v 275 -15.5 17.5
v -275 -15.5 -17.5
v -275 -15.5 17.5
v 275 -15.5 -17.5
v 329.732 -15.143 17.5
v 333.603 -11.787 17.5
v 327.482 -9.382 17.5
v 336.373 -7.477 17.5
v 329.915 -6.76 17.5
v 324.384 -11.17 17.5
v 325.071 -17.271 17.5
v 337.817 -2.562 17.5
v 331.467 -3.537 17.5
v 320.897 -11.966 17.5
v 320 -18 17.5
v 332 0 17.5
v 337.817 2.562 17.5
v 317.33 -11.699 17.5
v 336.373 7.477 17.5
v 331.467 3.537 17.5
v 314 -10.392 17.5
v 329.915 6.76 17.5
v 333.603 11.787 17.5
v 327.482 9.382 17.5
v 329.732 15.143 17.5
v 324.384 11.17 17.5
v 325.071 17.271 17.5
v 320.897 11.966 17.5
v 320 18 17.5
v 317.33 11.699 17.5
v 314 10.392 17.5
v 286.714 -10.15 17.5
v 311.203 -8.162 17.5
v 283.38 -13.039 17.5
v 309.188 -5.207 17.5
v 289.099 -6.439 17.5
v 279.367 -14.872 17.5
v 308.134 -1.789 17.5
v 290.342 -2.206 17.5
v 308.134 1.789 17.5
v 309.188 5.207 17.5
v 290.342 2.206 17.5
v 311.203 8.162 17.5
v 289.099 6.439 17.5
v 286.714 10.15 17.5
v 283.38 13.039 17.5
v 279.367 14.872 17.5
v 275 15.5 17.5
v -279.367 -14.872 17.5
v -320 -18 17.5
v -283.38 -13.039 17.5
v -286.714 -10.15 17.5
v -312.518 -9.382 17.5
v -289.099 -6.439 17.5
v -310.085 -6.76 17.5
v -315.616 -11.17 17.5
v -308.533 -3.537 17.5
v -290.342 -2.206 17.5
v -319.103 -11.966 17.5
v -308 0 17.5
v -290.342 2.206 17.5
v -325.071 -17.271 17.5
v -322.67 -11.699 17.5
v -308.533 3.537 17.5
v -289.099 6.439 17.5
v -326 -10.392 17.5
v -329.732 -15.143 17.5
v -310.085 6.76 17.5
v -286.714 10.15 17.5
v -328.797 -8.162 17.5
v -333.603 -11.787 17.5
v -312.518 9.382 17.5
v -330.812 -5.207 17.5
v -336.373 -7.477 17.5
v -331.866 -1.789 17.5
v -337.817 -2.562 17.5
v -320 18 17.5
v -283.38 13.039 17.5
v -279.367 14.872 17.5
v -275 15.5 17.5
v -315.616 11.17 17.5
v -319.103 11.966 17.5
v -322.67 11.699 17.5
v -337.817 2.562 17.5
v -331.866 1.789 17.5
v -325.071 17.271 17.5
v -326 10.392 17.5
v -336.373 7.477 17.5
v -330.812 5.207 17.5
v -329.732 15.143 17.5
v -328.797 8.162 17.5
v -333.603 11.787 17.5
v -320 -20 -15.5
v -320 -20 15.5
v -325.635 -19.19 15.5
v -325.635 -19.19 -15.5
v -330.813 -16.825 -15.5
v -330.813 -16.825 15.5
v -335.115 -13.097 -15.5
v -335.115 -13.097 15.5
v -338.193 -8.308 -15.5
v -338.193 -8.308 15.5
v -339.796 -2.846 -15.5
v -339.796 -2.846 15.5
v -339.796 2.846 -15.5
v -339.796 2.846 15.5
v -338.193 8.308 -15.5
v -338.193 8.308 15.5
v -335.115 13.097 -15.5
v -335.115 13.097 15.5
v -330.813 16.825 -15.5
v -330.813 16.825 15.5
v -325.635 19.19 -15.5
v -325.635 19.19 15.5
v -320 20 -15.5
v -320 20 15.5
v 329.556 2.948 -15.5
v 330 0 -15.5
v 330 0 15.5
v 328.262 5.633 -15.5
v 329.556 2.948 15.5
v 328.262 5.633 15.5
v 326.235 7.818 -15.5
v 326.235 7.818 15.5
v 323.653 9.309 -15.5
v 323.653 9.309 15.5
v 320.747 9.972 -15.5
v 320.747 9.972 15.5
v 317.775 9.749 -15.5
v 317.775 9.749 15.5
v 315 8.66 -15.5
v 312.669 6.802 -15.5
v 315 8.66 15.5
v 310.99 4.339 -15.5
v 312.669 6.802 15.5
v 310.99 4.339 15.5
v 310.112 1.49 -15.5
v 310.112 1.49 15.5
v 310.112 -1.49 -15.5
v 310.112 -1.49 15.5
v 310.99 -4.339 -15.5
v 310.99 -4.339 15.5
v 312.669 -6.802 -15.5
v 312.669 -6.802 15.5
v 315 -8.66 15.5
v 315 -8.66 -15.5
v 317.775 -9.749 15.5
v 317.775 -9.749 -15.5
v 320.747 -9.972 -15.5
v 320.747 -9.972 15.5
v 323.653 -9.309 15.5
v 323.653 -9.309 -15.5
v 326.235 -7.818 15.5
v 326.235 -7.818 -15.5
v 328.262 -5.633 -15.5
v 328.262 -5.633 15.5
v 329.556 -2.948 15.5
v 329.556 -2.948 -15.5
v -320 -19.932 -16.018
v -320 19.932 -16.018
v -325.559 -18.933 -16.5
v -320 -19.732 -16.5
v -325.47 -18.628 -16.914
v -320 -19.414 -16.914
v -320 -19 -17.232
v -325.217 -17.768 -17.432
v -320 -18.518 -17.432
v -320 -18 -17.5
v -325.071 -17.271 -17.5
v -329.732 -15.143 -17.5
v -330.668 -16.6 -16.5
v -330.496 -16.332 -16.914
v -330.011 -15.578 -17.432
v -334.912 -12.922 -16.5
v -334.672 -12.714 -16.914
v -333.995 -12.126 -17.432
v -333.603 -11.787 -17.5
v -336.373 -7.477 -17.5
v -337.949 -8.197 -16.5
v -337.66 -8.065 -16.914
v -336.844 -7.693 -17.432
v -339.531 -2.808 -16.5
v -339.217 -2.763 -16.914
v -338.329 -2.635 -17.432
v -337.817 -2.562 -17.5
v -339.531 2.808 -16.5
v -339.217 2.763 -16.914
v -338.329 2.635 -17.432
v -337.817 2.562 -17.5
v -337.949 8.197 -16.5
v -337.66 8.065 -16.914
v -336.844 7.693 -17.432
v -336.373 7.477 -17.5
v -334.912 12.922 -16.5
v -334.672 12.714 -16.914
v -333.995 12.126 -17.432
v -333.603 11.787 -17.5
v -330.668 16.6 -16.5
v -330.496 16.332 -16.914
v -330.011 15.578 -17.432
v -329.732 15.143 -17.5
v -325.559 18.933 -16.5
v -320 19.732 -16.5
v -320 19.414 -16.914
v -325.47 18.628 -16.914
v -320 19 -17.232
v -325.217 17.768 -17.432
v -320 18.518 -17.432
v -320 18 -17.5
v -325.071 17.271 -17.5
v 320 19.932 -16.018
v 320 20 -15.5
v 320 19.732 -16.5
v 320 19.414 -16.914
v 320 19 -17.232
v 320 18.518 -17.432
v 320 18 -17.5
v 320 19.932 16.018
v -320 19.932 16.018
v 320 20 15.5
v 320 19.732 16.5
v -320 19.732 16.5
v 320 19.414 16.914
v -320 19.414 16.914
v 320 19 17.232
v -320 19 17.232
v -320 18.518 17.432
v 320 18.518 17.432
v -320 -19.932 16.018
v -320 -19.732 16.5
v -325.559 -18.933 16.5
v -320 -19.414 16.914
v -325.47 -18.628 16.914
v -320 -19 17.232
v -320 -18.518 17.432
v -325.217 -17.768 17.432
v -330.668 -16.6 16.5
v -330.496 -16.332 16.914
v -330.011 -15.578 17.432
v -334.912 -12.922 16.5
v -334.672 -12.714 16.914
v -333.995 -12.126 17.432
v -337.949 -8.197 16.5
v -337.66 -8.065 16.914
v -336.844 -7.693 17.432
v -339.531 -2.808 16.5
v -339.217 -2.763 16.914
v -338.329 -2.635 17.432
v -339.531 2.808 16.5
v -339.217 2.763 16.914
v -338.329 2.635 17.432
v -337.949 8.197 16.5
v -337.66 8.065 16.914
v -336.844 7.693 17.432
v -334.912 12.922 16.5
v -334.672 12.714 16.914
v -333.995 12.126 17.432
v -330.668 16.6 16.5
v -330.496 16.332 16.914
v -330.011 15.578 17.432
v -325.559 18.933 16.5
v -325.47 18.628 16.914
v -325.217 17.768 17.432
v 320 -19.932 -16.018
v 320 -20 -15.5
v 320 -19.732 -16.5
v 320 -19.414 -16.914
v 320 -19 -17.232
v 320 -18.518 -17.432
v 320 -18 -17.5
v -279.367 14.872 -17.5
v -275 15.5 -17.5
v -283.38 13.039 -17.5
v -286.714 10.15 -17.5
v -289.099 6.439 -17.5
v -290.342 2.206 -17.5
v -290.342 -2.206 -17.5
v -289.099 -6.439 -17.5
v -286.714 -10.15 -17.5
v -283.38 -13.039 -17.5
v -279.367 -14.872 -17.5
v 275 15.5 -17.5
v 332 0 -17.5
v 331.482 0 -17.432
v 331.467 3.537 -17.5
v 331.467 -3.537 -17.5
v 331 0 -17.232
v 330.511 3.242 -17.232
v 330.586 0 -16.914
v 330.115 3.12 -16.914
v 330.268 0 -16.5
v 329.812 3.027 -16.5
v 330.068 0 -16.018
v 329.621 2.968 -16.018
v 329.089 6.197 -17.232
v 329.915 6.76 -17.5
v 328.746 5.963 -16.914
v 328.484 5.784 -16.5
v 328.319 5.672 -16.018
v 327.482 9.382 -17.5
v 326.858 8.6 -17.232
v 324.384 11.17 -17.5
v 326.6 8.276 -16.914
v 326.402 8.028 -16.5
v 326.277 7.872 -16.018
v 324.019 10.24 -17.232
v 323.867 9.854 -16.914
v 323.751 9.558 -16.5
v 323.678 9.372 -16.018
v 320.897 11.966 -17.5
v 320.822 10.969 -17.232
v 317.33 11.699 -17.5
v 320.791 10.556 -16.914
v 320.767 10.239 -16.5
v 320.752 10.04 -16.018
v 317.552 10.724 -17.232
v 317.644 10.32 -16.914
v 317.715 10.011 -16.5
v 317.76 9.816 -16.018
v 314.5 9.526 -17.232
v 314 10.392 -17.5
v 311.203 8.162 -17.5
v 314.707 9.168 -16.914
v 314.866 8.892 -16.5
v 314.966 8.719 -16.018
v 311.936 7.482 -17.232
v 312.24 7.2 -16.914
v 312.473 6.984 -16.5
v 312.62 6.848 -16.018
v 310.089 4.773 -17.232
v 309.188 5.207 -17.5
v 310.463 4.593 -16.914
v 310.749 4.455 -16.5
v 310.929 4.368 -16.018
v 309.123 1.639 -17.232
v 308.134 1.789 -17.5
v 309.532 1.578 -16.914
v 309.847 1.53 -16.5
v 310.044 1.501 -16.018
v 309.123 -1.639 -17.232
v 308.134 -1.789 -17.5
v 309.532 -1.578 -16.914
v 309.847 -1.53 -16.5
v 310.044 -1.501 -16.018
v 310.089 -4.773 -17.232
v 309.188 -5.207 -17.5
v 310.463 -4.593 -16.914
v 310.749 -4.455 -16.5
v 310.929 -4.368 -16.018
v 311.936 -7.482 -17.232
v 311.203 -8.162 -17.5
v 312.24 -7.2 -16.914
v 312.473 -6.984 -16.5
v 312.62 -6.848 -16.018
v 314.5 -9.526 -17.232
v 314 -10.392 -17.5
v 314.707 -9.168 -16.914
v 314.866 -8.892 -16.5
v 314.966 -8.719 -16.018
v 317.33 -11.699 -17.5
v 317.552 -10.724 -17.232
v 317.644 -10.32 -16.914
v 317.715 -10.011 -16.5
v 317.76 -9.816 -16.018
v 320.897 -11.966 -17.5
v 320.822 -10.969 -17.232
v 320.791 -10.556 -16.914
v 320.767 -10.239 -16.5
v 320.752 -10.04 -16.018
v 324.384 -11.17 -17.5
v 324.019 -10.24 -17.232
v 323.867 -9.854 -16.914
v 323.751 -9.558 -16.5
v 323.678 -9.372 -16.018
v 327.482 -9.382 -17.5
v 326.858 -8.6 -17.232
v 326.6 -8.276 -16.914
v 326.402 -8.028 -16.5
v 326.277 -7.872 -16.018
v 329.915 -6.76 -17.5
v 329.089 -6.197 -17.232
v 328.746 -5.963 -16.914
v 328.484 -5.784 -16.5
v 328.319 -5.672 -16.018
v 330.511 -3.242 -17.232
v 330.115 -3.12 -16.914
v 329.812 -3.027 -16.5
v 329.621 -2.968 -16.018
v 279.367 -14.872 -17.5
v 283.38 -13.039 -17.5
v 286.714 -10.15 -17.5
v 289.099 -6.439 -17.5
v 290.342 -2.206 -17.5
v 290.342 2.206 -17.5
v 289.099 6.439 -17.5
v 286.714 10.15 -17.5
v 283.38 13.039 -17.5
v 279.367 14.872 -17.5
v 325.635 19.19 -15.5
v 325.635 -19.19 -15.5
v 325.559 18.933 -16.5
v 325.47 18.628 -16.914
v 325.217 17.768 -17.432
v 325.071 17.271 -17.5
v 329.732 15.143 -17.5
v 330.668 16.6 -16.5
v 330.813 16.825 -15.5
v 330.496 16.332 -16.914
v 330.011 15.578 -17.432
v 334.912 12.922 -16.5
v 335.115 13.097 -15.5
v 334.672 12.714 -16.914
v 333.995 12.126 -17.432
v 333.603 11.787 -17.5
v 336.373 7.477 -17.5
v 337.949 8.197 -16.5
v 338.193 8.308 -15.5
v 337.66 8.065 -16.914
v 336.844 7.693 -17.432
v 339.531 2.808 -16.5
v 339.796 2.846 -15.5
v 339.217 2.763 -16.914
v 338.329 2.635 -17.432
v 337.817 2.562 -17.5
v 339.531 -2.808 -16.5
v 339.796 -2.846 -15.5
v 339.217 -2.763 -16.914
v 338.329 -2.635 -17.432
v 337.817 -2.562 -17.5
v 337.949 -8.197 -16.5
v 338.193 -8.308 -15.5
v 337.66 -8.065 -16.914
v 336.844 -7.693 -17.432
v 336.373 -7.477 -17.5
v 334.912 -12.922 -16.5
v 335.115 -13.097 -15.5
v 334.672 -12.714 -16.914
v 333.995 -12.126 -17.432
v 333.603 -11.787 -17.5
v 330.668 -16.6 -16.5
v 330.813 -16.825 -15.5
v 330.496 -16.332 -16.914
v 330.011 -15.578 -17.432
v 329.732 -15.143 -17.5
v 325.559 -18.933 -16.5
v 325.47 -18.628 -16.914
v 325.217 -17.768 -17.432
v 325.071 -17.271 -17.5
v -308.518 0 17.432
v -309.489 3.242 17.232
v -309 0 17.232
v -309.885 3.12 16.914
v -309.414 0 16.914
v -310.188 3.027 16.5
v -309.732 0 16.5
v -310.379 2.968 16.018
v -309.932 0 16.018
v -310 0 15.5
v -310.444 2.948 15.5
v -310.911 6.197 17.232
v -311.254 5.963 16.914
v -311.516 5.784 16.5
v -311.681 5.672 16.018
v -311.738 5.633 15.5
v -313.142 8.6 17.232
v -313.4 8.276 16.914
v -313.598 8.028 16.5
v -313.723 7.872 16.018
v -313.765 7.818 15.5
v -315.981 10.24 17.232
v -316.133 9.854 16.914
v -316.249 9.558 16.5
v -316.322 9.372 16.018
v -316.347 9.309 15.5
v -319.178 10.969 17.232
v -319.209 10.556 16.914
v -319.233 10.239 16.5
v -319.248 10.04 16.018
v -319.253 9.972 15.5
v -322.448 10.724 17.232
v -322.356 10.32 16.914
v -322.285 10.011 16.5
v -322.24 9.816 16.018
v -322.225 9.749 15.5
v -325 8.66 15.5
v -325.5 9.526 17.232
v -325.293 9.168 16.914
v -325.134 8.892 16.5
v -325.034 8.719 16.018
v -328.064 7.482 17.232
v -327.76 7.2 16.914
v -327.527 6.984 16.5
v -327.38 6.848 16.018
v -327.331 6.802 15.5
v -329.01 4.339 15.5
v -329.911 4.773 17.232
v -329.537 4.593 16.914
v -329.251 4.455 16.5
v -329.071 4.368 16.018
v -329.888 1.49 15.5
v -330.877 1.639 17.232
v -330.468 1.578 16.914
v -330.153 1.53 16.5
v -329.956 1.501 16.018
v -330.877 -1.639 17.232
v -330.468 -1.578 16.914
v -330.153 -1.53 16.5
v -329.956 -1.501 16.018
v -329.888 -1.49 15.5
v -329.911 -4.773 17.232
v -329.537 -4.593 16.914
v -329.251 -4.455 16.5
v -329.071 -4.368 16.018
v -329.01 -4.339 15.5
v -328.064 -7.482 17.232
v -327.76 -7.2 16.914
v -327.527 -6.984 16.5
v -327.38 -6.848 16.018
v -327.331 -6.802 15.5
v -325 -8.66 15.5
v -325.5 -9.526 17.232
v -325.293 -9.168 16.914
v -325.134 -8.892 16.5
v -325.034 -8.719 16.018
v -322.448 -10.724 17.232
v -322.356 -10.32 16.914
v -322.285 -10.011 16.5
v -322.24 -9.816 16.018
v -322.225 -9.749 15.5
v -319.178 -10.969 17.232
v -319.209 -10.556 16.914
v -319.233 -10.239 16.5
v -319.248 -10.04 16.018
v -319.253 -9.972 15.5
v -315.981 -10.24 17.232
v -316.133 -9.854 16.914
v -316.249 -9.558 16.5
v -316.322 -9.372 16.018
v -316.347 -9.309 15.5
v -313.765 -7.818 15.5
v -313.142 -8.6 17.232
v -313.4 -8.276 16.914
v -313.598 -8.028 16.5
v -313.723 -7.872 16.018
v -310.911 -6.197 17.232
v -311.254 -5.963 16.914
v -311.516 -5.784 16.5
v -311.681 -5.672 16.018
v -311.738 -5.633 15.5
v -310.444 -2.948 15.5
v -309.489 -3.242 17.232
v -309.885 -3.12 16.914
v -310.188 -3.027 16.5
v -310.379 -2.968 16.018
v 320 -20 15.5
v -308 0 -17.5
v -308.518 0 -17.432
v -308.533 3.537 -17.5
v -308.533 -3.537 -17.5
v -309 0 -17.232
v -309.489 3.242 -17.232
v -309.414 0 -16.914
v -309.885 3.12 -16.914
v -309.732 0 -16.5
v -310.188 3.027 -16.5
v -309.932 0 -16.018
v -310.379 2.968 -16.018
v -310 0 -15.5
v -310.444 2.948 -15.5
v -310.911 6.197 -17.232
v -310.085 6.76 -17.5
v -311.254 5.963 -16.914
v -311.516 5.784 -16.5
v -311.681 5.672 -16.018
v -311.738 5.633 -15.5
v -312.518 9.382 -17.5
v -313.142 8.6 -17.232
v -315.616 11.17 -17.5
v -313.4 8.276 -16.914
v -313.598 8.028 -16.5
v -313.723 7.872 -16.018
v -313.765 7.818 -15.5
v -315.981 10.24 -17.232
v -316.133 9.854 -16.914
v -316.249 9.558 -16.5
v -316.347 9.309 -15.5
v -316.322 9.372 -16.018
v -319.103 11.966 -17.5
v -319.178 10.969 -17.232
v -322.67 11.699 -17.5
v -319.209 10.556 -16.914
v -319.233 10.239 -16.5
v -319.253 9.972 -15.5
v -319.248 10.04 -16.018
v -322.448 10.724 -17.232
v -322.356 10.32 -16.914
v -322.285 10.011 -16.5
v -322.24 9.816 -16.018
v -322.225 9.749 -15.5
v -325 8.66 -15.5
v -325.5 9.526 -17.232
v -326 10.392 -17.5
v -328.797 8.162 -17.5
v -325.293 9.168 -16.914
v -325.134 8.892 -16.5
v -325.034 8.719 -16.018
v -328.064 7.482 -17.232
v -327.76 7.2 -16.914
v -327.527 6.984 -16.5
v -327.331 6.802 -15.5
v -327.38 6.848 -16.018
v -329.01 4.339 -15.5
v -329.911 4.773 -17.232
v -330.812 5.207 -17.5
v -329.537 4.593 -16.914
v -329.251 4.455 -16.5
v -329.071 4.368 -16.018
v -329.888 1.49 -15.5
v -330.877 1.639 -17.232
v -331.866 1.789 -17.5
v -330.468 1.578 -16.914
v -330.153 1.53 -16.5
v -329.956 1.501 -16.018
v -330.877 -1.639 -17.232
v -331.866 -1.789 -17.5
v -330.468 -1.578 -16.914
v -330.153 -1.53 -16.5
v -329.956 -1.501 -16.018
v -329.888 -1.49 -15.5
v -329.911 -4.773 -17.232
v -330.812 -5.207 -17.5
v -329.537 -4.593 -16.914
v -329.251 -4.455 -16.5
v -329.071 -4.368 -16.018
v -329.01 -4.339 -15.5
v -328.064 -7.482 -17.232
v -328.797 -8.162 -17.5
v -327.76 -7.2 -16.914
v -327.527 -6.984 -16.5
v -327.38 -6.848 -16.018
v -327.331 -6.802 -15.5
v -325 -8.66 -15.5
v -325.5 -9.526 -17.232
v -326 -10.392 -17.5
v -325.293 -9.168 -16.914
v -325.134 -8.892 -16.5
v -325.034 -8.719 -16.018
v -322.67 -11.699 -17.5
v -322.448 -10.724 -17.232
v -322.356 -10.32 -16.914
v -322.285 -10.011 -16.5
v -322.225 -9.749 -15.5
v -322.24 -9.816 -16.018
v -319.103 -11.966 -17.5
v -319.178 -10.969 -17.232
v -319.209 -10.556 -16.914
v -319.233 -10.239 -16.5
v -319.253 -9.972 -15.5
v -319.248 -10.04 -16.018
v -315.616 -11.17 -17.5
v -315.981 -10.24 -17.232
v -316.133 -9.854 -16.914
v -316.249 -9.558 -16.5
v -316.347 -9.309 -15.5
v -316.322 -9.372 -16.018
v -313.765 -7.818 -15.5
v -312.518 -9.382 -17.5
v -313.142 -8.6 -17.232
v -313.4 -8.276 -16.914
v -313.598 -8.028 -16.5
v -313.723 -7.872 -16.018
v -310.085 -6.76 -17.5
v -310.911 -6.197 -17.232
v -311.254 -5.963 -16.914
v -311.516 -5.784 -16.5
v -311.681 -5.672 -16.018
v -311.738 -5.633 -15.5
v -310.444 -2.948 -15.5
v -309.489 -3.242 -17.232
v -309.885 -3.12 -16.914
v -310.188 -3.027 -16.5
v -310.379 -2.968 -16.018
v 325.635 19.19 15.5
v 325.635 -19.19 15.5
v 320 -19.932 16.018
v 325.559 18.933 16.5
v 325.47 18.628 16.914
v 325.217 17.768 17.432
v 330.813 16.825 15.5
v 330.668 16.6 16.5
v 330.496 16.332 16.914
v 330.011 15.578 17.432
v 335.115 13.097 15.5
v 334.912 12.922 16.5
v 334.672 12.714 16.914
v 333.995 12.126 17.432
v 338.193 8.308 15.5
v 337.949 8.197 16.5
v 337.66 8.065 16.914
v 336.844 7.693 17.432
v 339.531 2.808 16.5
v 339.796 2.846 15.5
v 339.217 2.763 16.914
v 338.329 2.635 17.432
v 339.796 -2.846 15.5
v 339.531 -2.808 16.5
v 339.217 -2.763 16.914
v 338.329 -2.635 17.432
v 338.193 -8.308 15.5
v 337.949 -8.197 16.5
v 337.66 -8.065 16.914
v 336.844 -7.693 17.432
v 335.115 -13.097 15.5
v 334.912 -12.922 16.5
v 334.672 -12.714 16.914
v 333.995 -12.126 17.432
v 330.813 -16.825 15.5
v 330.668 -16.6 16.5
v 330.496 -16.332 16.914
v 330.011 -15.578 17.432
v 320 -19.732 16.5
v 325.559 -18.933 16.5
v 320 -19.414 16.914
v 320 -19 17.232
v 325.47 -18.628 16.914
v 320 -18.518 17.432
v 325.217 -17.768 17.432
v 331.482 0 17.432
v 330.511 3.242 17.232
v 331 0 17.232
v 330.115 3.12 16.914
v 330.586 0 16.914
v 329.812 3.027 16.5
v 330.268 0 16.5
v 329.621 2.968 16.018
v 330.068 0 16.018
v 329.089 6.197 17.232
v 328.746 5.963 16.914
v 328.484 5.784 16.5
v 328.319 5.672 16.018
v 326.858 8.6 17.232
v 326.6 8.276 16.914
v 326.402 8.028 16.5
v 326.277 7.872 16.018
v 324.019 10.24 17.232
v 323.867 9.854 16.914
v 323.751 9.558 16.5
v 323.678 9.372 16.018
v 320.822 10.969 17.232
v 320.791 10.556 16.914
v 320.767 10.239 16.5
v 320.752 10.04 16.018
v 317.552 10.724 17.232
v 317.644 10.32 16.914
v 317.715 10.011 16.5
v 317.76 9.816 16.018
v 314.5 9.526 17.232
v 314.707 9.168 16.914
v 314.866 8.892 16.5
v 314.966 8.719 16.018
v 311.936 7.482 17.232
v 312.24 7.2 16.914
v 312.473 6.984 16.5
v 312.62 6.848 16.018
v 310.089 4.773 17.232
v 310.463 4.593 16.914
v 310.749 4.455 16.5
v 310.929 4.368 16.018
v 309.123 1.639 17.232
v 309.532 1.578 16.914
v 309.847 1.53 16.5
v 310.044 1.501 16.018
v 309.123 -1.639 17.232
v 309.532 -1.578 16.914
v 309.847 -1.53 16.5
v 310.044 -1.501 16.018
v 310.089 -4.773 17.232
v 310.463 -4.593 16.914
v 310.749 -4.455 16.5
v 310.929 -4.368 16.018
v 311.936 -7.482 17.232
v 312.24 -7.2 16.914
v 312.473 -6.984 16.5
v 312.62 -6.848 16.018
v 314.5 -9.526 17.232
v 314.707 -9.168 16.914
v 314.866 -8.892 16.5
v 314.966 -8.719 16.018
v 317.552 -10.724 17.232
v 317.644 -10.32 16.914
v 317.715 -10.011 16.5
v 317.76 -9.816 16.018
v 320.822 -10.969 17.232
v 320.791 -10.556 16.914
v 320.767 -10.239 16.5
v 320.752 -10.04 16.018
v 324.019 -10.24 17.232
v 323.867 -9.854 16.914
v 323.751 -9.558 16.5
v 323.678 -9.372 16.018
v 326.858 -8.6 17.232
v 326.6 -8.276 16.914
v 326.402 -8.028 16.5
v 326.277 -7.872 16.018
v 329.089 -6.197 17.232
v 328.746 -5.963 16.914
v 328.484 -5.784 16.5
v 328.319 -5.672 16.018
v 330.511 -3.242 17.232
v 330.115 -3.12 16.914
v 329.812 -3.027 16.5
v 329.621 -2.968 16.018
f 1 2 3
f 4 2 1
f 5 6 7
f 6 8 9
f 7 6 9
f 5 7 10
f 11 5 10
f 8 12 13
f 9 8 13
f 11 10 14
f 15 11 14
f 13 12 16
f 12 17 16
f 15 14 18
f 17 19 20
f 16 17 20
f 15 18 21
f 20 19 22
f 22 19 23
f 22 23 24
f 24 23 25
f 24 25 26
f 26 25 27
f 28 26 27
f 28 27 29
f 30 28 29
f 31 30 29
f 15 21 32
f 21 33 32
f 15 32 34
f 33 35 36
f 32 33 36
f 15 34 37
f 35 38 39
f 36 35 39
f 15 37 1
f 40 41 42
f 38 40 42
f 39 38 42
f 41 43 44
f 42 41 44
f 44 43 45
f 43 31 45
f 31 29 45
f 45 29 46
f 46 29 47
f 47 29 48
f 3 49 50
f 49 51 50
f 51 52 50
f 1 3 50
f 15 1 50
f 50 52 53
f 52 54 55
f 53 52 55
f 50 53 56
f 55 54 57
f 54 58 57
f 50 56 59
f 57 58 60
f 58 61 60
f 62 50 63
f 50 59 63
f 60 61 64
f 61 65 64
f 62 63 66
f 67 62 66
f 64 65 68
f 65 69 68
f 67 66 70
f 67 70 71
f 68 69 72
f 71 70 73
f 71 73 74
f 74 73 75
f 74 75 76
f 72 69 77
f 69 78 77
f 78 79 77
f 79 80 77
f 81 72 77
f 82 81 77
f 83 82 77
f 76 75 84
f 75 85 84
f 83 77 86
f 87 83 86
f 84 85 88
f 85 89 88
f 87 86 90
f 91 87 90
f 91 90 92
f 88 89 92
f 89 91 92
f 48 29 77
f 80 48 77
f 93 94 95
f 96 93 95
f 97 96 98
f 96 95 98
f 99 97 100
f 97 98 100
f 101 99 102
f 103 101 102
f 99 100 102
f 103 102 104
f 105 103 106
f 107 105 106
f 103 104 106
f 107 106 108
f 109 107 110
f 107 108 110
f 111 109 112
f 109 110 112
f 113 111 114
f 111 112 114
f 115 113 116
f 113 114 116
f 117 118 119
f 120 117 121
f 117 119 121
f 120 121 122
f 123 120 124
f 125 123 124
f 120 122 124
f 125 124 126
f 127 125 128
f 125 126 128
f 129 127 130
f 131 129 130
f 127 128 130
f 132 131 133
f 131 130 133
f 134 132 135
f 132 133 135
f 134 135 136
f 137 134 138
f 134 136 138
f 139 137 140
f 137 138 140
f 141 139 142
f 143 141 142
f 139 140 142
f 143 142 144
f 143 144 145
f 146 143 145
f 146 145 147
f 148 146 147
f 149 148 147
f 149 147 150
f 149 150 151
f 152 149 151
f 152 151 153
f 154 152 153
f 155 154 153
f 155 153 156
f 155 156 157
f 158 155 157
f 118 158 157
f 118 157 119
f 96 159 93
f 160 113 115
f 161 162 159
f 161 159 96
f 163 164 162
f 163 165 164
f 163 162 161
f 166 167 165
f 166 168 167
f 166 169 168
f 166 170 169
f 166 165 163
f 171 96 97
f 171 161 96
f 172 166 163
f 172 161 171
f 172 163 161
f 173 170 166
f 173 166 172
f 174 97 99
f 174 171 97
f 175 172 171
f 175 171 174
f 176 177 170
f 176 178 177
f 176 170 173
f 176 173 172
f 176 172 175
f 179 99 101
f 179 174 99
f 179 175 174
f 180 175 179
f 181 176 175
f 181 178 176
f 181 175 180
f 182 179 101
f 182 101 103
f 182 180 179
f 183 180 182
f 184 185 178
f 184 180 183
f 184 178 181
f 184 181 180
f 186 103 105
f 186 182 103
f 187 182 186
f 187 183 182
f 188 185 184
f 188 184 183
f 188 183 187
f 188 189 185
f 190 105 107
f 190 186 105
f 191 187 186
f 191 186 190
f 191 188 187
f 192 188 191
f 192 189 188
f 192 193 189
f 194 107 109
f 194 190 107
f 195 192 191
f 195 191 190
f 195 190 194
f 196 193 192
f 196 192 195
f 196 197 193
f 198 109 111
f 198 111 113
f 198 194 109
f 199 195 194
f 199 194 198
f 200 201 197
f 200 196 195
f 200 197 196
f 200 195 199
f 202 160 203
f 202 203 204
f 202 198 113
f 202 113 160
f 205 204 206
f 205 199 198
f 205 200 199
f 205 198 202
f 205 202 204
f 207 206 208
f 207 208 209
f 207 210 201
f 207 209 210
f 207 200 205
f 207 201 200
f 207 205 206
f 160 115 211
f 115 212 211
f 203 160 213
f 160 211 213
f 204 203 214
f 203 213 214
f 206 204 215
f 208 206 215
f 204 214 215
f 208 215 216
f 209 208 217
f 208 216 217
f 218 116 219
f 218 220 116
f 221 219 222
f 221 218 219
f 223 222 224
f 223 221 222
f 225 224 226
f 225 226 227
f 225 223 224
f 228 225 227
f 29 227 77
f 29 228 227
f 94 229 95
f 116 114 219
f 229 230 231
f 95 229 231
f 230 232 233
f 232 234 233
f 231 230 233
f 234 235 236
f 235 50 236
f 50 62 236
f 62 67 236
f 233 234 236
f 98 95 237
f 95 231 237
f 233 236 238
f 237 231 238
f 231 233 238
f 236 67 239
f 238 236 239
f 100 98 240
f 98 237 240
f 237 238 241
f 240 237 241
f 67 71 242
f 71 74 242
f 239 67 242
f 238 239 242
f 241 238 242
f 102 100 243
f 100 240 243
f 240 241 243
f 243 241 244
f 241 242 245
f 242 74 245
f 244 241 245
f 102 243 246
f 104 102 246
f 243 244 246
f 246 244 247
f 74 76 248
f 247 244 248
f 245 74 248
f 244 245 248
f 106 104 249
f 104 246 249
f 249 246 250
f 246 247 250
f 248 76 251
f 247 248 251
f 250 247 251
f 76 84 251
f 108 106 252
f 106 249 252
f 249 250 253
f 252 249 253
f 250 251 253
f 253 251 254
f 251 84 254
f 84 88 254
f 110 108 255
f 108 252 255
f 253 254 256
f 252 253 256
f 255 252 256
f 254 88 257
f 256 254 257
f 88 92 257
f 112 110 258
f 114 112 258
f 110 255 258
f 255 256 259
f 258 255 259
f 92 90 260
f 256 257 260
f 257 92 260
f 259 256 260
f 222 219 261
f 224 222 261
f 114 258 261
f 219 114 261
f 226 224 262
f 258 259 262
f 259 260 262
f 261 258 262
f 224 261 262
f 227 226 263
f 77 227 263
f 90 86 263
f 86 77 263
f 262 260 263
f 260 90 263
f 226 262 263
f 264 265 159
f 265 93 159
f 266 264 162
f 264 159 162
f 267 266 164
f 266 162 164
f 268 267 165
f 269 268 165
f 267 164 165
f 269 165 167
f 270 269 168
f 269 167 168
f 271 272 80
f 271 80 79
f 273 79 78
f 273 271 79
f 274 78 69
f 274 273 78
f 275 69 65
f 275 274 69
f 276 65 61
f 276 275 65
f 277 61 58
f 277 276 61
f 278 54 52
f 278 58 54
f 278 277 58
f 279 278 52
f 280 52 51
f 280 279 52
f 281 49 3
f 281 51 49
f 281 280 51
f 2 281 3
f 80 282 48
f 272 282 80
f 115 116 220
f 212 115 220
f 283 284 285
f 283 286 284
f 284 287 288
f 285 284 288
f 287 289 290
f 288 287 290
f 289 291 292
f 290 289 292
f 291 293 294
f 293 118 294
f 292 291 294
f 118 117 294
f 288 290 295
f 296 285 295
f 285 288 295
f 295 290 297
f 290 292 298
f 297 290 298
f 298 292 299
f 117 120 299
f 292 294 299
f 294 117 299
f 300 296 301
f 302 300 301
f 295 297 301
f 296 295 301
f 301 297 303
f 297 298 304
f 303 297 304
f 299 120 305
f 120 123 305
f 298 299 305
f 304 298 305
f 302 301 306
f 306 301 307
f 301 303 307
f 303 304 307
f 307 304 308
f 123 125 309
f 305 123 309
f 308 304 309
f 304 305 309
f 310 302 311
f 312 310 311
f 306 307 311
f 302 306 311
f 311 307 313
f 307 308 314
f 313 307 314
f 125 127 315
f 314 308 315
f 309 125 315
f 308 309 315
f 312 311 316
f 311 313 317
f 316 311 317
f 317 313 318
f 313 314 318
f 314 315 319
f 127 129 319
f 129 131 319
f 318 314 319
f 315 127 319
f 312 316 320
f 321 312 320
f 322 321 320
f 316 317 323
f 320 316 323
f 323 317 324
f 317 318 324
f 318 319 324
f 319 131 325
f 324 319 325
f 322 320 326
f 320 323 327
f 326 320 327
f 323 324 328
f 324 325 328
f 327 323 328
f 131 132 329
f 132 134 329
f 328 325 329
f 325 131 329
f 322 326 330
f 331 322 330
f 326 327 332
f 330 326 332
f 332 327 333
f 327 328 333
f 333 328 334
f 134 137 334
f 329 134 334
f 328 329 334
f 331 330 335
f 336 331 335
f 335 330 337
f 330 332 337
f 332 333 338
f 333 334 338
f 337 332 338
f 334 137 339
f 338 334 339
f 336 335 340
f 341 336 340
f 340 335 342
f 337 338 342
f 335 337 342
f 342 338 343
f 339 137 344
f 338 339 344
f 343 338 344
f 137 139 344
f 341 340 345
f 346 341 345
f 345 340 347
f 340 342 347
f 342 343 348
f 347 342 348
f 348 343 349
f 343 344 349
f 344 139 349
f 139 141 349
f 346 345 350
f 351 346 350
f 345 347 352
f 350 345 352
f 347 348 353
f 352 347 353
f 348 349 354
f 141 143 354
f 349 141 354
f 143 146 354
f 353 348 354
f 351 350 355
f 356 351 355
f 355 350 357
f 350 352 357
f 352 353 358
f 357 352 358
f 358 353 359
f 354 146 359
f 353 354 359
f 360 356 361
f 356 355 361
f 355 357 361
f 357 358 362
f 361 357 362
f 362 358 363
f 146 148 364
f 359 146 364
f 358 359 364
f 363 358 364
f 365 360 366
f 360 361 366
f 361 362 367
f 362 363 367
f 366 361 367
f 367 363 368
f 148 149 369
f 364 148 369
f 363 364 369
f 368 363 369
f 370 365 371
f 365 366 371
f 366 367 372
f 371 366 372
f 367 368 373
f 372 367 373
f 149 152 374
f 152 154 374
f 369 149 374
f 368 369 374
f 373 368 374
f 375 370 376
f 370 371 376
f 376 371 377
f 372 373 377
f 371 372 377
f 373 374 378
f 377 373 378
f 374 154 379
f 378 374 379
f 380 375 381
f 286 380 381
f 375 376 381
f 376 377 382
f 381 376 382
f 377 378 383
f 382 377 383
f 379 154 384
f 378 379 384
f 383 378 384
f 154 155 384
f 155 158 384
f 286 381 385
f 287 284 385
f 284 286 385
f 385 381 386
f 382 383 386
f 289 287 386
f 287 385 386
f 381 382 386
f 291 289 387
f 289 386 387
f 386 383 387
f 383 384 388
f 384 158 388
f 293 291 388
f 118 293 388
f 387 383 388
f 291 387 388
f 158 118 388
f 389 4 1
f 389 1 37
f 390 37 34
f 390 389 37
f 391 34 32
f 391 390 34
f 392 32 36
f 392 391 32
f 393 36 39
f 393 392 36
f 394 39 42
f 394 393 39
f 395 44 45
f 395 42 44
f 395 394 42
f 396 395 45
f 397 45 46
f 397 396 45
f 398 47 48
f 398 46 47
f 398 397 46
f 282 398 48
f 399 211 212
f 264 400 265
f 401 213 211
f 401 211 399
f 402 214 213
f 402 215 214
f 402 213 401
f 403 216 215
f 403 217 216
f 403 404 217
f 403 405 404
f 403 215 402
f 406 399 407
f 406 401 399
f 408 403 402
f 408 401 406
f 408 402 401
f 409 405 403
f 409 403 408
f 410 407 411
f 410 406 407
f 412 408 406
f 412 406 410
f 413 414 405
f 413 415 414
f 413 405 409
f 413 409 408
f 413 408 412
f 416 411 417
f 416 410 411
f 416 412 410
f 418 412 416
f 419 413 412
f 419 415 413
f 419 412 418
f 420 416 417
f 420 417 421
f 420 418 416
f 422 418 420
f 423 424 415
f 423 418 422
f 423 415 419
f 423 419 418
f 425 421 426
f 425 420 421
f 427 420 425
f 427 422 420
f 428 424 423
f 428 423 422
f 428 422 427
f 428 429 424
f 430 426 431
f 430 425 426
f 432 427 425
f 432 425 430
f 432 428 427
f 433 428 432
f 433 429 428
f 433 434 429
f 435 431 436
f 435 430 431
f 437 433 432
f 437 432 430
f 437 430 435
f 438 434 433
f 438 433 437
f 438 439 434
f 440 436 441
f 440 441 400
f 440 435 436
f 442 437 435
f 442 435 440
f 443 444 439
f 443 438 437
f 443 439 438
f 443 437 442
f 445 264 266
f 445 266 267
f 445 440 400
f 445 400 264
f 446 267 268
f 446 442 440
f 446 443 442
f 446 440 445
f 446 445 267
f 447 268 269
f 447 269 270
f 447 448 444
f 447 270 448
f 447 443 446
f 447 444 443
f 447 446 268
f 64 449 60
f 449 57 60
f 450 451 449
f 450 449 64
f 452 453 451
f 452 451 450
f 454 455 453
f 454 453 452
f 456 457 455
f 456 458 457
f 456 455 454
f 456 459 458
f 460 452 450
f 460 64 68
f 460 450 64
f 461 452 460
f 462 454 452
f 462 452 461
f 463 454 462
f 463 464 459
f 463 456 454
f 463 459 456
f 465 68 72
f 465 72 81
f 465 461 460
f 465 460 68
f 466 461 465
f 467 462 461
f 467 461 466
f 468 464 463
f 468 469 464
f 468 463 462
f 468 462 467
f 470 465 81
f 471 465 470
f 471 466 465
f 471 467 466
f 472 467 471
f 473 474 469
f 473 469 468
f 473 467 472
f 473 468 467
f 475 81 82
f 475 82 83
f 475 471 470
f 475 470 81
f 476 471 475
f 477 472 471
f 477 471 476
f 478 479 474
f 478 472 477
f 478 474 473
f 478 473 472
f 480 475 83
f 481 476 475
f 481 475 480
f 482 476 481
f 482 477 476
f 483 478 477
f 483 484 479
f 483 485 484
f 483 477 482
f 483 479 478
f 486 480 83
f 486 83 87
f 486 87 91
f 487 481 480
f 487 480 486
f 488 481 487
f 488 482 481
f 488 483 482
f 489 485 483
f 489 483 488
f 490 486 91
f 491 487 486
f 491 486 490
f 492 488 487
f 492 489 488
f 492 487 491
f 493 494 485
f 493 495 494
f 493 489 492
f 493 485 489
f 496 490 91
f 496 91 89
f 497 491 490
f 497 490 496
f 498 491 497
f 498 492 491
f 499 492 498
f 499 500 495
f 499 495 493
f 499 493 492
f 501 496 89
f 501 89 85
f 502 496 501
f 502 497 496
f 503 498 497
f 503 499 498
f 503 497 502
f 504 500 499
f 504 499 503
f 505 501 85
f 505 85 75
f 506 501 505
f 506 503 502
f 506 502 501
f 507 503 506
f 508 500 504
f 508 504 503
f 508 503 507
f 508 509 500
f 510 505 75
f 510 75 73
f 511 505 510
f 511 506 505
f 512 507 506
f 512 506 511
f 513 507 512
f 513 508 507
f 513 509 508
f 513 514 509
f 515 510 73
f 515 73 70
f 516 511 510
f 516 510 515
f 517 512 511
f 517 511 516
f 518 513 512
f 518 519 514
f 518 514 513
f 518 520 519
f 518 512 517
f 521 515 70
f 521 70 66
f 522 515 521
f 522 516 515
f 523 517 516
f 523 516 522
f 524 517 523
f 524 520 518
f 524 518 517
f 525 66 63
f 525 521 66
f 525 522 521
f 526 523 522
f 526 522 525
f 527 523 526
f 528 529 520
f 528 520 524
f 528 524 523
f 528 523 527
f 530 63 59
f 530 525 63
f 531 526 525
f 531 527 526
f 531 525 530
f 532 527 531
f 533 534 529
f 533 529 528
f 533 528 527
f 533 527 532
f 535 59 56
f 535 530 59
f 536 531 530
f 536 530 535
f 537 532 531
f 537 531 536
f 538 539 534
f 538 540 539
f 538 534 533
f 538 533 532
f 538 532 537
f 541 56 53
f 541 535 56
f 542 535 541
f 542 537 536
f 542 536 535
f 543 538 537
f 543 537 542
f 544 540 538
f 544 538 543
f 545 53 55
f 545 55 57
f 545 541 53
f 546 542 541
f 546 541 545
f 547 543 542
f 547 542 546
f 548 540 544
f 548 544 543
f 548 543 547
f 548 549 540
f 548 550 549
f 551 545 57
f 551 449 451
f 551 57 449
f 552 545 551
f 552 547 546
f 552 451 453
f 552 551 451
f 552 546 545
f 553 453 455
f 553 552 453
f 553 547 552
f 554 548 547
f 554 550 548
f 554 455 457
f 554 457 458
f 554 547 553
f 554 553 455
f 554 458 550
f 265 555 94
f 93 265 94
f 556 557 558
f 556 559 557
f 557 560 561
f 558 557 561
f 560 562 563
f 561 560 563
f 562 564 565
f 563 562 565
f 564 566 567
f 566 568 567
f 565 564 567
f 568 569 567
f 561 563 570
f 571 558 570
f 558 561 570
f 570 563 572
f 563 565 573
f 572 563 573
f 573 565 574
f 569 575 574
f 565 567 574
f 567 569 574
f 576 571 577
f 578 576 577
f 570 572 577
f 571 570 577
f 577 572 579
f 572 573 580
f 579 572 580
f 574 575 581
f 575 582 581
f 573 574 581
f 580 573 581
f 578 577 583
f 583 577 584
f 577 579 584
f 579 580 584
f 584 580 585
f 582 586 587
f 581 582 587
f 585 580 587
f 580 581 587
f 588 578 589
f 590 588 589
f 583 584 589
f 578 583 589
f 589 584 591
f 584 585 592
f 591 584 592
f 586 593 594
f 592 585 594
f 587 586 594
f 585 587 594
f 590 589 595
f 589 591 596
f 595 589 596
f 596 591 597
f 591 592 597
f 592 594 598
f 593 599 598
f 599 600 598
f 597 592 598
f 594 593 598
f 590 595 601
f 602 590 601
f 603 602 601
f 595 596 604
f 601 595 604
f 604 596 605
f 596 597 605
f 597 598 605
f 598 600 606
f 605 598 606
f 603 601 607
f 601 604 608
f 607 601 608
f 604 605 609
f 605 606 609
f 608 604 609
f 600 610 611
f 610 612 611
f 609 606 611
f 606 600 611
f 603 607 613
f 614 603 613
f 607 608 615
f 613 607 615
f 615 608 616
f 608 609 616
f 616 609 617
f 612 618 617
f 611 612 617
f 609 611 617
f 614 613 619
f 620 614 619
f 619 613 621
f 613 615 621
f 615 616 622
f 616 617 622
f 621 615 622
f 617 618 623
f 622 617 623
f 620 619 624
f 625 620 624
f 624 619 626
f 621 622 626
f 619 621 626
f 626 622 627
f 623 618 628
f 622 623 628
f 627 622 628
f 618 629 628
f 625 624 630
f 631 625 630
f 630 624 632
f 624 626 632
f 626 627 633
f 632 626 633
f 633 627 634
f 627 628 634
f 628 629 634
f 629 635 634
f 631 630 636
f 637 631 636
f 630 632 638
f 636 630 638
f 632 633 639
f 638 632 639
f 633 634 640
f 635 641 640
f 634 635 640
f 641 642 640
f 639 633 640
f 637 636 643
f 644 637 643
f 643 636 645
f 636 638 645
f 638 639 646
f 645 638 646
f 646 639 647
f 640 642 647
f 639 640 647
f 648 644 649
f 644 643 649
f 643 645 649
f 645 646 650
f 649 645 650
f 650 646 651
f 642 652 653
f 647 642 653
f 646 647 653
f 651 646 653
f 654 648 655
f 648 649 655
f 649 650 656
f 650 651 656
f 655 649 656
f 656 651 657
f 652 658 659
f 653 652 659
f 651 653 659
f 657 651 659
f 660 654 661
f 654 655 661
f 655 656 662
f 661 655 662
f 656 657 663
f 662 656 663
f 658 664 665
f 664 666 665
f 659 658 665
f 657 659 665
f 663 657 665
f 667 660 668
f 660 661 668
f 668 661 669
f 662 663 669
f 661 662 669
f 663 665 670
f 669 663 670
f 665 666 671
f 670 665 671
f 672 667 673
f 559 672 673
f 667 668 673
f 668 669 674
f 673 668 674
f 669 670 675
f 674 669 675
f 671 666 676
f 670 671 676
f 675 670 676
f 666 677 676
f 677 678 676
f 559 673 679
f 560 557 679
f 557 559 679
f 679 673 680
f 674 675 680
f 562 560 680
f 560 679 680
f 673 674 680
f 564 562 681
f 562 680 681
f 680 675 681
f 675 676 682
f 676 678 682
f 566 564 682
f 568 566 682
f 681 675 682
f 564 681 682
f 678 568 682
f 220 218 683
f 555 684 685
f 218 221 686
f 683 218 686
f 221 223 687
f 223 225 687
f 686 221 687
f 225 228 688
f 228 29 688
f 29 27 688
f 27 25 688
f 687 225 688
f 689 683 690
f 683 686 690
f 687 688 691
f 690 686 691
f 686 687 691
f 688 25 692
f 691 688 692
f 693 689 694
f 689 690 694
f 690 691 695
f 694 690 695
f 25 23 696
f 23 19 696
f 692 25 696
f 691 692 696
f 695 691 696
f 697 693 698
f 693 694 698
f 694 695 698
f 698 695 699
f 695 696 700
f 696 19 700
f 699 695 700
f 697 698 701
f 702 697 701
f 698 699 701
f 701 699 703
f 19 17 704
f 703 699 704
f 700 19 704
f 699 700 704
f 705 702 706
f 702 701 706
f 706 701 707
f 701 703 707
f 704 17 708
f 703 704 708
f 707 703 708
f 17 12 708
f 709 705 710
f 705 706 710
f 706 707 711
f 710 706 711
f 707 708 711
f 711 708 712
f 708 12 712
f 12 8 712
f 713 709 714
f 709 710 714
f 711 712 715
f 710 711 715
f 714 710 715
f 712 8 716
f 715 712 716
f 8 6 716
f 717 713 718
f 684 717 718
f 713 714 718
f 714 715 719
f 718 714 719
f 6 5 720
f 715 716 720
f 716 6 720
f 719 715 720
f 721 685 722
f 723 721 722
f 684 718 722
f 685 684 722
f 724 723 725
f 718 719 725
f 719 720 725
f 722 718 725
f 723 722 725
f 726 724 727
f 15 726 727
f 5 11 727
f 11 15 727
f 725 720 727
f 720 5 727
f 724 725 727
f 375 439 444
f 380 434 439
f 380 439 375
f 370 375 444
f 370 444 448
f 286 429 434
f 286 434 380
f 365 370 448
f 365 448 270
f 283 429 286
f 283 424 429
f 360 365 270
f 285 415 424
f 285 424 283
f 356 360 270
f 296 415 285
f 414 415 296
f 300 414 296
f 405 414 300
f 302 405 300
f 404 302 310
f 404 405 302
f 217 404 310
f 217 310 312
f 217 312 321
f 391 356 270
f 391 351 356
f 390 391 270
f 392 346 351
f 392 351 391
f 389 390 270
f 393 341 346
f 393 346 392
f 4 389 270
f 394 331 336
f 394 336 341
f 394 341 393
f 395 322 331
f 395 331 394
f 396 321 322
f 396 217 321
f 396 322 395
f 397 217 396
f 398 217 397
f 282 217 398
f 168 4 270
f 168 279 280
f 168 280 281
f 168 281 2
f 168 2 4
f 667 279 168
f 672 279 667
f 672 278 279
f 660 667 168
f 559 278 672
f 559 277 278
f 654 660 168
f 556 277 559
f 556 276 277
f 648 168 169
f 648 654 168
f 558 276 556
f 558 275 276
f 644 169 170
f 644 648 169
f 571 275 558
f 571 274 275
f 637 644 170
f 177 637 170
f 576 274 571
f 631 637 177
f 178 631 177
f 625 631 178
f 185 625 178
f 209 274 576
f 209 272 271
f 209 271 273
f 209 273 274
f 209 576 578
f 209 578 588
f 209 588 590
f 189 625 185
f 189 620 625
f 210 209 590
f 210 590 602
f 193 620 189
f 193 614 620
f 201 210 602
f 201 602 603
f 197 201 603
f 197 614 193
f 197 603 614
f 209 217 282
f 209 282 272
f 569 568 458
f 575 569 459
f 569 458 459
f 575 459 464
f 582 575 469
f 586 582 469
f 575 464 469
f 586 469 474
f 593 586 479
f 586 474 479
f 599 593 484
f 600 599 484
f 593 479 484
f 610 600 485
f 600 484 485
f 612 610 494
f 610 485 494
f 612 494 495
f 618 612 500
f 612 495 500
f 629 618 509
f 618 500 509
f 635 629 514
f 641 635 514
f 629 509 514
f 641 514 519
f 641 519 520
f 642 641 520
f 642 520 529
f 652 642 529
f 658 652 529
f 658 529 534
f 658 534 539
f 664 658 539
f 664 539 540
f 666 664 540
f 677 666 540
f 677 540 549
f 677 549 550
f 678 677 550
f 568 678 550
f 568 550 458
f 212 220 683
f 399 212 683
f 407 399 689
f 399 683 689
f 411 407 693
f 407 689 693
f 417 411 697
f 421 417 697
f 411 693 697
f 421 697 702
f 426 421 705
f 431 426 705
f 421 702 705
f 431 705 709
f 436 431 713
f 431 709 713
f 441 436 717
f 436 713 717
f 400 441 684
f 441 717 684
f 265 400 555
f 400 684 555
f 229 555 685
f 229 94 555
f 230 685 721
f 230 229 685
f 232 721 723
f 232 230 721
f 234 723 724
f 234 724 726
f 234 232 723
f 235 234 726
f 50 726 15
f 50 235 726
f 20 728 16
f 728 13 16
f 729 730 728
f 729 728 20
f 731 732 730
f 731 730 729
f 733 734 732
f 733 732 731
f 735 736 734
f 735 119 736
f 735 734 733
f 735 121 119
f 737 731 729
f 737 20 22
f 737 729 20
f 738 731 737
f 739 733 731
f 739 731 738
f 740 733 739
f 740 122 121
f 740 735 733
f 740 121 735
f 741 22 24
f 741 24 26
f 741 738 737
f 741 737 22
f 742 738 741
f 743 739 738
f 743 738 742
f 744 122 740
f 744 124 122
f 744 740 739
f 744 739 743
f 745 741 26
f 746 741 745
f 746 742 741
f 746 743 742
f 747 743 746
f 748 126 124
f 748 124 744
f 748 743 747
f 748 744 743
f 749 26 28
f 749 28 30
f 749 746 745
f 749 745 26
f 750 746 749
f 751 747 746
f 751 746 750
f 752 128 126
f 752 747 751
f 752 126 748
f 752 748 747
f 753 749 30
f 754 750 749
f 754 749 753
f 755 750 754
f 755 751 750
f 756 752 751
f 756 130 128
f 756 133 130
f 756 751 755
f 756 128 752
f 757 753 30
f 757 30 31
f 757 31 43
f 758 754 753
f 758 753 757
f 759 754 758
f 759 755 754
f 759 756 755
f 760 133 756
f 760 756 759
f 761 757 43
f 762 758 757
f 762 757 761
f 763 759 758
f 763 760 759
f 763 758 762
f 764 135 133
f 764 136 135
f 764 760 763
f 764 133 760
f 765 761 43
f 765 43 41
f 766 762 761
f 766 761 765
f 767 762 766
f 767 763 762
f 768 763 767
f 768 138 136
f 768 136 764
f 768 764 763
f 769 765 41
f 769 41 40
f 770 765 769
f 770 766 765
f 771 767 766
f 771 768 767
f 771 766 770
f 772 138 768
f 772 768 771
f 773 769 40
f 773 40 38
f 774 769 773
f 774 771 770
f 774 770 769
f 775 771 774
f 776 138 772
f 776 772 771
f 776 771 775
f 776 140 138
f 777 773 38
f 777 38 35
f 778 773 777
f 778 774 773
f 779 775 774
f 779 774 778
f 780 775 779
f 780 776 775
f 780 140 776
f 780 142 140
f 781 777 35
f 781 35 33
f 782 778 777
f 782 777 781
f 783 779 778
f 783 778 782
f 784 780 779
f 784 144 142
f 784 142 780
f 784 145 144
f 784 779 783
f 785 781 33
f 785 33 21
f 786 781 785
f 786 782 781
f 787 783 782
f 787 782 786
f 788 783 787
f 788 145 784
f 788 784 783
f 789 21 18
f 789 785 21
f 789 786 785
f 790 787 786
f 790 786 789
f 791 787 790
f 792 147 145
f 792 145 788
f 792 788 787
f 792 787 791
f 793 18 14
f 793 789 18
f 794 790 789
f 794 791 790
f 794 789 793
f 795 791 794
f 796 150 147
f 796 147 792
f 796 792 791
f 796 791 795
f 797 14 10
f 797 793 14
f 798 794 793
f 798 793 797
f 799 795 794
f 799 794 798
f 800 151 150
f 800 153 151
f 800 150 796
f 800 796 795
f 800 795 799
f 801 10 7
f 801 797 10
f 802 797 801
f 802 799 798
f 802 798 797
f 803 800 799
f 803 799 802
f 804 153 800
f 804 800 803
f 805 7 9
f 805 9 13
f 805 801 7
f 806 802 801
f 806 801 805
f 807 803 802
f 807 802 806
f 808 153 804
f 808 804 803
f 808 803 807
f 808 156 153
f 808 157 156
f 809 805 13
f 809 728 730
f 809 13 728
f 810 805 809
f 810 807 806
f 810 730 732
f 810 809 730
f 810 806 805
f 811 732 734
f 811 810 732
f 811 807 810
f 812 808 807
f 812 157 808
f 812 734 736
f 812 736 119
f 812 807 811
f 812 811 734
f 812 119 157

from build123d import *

# Parameters (mm, degrees)
BOSS_EXTRUDE2_DEPTH = 17.5
SKETCH5_R           = 10
CUT_EXTRUDE1_DEPTH  = 36
CUT_EXTRUDE2_DEPTH  = 40
FILLET1_R           = 2


with BuildPart() as part:
    # Sketch4 → Boss-Extrude2 (new body, symmetric)
    with BuildSketch(Plane.XY):
        with BuildLine():
            Line((-320, 20), (320, 20))
            ThreePointArc((320, 20), (340, 0), (320, -20))
            Line((320, -20), (-320, -20))
            ThreePointArc((-320, -20), (-340, 0), (-320, 20))
        make_face()
    extrude(amount=BOSS_EXTRUDE2_DEPTH, both=True)

    # Sketch5 → Cut-Extrude1 (cut, through all)
    with BuildSketch(Plane.XY.offset(17.5)):
        with Locations((320, 0)):
            Circle(SKETCH5_R)
        with Locations((-320, 0)):
            Circle(SKETCH5_R)
    extrude(amount=-CUT_EXTRUDE1_DEPTH, mode=Mode.SUBTRACT)

    # Sketch6 → Cut-Extrude2 (cut)
    with BuildSketch(Plane(origin=(0, 0, -17.5), x_dir=(-1, 0, 0), z_dir=(0, 0, -1))):
        with BuildLine():
            Line((-275, 15.5), (275, 15.5))
            ThreePointArc((275, 15.5), (290.5, 0), (275, -15.5))
            Line((275, -15.5), (-275, -15.5))
            ThreePointArc((-275, -15.5), (-290.5, 0), (-275, 15.5))
        make_face()
    extrude(amount=-CUT_EXTRUDE2_DEPTH, mode=Mode.SUBTRACT)

    # Fillet1
    fillet1_edges = [part.edges().sort_by_distance(p)[0] for p in [
        (340, 0, 17.5),
        (310, 0, -17.5),
        (310, 0, 17.5),
        (0, 20, 17.5),
        (-330, 0, -17.5),
        (-330, 0, 17.5),
        (-340, 0, 17.5),
        (0, 20, -17.5),
        (340, 0, -17.5),
        (0, -20, -17.5),
        (-340, 0, -17.5),
        (0, -20, 17.5),
    ]]
    fillet(fillet1_edges, radius=FILLET1_R)


solid = part.part
